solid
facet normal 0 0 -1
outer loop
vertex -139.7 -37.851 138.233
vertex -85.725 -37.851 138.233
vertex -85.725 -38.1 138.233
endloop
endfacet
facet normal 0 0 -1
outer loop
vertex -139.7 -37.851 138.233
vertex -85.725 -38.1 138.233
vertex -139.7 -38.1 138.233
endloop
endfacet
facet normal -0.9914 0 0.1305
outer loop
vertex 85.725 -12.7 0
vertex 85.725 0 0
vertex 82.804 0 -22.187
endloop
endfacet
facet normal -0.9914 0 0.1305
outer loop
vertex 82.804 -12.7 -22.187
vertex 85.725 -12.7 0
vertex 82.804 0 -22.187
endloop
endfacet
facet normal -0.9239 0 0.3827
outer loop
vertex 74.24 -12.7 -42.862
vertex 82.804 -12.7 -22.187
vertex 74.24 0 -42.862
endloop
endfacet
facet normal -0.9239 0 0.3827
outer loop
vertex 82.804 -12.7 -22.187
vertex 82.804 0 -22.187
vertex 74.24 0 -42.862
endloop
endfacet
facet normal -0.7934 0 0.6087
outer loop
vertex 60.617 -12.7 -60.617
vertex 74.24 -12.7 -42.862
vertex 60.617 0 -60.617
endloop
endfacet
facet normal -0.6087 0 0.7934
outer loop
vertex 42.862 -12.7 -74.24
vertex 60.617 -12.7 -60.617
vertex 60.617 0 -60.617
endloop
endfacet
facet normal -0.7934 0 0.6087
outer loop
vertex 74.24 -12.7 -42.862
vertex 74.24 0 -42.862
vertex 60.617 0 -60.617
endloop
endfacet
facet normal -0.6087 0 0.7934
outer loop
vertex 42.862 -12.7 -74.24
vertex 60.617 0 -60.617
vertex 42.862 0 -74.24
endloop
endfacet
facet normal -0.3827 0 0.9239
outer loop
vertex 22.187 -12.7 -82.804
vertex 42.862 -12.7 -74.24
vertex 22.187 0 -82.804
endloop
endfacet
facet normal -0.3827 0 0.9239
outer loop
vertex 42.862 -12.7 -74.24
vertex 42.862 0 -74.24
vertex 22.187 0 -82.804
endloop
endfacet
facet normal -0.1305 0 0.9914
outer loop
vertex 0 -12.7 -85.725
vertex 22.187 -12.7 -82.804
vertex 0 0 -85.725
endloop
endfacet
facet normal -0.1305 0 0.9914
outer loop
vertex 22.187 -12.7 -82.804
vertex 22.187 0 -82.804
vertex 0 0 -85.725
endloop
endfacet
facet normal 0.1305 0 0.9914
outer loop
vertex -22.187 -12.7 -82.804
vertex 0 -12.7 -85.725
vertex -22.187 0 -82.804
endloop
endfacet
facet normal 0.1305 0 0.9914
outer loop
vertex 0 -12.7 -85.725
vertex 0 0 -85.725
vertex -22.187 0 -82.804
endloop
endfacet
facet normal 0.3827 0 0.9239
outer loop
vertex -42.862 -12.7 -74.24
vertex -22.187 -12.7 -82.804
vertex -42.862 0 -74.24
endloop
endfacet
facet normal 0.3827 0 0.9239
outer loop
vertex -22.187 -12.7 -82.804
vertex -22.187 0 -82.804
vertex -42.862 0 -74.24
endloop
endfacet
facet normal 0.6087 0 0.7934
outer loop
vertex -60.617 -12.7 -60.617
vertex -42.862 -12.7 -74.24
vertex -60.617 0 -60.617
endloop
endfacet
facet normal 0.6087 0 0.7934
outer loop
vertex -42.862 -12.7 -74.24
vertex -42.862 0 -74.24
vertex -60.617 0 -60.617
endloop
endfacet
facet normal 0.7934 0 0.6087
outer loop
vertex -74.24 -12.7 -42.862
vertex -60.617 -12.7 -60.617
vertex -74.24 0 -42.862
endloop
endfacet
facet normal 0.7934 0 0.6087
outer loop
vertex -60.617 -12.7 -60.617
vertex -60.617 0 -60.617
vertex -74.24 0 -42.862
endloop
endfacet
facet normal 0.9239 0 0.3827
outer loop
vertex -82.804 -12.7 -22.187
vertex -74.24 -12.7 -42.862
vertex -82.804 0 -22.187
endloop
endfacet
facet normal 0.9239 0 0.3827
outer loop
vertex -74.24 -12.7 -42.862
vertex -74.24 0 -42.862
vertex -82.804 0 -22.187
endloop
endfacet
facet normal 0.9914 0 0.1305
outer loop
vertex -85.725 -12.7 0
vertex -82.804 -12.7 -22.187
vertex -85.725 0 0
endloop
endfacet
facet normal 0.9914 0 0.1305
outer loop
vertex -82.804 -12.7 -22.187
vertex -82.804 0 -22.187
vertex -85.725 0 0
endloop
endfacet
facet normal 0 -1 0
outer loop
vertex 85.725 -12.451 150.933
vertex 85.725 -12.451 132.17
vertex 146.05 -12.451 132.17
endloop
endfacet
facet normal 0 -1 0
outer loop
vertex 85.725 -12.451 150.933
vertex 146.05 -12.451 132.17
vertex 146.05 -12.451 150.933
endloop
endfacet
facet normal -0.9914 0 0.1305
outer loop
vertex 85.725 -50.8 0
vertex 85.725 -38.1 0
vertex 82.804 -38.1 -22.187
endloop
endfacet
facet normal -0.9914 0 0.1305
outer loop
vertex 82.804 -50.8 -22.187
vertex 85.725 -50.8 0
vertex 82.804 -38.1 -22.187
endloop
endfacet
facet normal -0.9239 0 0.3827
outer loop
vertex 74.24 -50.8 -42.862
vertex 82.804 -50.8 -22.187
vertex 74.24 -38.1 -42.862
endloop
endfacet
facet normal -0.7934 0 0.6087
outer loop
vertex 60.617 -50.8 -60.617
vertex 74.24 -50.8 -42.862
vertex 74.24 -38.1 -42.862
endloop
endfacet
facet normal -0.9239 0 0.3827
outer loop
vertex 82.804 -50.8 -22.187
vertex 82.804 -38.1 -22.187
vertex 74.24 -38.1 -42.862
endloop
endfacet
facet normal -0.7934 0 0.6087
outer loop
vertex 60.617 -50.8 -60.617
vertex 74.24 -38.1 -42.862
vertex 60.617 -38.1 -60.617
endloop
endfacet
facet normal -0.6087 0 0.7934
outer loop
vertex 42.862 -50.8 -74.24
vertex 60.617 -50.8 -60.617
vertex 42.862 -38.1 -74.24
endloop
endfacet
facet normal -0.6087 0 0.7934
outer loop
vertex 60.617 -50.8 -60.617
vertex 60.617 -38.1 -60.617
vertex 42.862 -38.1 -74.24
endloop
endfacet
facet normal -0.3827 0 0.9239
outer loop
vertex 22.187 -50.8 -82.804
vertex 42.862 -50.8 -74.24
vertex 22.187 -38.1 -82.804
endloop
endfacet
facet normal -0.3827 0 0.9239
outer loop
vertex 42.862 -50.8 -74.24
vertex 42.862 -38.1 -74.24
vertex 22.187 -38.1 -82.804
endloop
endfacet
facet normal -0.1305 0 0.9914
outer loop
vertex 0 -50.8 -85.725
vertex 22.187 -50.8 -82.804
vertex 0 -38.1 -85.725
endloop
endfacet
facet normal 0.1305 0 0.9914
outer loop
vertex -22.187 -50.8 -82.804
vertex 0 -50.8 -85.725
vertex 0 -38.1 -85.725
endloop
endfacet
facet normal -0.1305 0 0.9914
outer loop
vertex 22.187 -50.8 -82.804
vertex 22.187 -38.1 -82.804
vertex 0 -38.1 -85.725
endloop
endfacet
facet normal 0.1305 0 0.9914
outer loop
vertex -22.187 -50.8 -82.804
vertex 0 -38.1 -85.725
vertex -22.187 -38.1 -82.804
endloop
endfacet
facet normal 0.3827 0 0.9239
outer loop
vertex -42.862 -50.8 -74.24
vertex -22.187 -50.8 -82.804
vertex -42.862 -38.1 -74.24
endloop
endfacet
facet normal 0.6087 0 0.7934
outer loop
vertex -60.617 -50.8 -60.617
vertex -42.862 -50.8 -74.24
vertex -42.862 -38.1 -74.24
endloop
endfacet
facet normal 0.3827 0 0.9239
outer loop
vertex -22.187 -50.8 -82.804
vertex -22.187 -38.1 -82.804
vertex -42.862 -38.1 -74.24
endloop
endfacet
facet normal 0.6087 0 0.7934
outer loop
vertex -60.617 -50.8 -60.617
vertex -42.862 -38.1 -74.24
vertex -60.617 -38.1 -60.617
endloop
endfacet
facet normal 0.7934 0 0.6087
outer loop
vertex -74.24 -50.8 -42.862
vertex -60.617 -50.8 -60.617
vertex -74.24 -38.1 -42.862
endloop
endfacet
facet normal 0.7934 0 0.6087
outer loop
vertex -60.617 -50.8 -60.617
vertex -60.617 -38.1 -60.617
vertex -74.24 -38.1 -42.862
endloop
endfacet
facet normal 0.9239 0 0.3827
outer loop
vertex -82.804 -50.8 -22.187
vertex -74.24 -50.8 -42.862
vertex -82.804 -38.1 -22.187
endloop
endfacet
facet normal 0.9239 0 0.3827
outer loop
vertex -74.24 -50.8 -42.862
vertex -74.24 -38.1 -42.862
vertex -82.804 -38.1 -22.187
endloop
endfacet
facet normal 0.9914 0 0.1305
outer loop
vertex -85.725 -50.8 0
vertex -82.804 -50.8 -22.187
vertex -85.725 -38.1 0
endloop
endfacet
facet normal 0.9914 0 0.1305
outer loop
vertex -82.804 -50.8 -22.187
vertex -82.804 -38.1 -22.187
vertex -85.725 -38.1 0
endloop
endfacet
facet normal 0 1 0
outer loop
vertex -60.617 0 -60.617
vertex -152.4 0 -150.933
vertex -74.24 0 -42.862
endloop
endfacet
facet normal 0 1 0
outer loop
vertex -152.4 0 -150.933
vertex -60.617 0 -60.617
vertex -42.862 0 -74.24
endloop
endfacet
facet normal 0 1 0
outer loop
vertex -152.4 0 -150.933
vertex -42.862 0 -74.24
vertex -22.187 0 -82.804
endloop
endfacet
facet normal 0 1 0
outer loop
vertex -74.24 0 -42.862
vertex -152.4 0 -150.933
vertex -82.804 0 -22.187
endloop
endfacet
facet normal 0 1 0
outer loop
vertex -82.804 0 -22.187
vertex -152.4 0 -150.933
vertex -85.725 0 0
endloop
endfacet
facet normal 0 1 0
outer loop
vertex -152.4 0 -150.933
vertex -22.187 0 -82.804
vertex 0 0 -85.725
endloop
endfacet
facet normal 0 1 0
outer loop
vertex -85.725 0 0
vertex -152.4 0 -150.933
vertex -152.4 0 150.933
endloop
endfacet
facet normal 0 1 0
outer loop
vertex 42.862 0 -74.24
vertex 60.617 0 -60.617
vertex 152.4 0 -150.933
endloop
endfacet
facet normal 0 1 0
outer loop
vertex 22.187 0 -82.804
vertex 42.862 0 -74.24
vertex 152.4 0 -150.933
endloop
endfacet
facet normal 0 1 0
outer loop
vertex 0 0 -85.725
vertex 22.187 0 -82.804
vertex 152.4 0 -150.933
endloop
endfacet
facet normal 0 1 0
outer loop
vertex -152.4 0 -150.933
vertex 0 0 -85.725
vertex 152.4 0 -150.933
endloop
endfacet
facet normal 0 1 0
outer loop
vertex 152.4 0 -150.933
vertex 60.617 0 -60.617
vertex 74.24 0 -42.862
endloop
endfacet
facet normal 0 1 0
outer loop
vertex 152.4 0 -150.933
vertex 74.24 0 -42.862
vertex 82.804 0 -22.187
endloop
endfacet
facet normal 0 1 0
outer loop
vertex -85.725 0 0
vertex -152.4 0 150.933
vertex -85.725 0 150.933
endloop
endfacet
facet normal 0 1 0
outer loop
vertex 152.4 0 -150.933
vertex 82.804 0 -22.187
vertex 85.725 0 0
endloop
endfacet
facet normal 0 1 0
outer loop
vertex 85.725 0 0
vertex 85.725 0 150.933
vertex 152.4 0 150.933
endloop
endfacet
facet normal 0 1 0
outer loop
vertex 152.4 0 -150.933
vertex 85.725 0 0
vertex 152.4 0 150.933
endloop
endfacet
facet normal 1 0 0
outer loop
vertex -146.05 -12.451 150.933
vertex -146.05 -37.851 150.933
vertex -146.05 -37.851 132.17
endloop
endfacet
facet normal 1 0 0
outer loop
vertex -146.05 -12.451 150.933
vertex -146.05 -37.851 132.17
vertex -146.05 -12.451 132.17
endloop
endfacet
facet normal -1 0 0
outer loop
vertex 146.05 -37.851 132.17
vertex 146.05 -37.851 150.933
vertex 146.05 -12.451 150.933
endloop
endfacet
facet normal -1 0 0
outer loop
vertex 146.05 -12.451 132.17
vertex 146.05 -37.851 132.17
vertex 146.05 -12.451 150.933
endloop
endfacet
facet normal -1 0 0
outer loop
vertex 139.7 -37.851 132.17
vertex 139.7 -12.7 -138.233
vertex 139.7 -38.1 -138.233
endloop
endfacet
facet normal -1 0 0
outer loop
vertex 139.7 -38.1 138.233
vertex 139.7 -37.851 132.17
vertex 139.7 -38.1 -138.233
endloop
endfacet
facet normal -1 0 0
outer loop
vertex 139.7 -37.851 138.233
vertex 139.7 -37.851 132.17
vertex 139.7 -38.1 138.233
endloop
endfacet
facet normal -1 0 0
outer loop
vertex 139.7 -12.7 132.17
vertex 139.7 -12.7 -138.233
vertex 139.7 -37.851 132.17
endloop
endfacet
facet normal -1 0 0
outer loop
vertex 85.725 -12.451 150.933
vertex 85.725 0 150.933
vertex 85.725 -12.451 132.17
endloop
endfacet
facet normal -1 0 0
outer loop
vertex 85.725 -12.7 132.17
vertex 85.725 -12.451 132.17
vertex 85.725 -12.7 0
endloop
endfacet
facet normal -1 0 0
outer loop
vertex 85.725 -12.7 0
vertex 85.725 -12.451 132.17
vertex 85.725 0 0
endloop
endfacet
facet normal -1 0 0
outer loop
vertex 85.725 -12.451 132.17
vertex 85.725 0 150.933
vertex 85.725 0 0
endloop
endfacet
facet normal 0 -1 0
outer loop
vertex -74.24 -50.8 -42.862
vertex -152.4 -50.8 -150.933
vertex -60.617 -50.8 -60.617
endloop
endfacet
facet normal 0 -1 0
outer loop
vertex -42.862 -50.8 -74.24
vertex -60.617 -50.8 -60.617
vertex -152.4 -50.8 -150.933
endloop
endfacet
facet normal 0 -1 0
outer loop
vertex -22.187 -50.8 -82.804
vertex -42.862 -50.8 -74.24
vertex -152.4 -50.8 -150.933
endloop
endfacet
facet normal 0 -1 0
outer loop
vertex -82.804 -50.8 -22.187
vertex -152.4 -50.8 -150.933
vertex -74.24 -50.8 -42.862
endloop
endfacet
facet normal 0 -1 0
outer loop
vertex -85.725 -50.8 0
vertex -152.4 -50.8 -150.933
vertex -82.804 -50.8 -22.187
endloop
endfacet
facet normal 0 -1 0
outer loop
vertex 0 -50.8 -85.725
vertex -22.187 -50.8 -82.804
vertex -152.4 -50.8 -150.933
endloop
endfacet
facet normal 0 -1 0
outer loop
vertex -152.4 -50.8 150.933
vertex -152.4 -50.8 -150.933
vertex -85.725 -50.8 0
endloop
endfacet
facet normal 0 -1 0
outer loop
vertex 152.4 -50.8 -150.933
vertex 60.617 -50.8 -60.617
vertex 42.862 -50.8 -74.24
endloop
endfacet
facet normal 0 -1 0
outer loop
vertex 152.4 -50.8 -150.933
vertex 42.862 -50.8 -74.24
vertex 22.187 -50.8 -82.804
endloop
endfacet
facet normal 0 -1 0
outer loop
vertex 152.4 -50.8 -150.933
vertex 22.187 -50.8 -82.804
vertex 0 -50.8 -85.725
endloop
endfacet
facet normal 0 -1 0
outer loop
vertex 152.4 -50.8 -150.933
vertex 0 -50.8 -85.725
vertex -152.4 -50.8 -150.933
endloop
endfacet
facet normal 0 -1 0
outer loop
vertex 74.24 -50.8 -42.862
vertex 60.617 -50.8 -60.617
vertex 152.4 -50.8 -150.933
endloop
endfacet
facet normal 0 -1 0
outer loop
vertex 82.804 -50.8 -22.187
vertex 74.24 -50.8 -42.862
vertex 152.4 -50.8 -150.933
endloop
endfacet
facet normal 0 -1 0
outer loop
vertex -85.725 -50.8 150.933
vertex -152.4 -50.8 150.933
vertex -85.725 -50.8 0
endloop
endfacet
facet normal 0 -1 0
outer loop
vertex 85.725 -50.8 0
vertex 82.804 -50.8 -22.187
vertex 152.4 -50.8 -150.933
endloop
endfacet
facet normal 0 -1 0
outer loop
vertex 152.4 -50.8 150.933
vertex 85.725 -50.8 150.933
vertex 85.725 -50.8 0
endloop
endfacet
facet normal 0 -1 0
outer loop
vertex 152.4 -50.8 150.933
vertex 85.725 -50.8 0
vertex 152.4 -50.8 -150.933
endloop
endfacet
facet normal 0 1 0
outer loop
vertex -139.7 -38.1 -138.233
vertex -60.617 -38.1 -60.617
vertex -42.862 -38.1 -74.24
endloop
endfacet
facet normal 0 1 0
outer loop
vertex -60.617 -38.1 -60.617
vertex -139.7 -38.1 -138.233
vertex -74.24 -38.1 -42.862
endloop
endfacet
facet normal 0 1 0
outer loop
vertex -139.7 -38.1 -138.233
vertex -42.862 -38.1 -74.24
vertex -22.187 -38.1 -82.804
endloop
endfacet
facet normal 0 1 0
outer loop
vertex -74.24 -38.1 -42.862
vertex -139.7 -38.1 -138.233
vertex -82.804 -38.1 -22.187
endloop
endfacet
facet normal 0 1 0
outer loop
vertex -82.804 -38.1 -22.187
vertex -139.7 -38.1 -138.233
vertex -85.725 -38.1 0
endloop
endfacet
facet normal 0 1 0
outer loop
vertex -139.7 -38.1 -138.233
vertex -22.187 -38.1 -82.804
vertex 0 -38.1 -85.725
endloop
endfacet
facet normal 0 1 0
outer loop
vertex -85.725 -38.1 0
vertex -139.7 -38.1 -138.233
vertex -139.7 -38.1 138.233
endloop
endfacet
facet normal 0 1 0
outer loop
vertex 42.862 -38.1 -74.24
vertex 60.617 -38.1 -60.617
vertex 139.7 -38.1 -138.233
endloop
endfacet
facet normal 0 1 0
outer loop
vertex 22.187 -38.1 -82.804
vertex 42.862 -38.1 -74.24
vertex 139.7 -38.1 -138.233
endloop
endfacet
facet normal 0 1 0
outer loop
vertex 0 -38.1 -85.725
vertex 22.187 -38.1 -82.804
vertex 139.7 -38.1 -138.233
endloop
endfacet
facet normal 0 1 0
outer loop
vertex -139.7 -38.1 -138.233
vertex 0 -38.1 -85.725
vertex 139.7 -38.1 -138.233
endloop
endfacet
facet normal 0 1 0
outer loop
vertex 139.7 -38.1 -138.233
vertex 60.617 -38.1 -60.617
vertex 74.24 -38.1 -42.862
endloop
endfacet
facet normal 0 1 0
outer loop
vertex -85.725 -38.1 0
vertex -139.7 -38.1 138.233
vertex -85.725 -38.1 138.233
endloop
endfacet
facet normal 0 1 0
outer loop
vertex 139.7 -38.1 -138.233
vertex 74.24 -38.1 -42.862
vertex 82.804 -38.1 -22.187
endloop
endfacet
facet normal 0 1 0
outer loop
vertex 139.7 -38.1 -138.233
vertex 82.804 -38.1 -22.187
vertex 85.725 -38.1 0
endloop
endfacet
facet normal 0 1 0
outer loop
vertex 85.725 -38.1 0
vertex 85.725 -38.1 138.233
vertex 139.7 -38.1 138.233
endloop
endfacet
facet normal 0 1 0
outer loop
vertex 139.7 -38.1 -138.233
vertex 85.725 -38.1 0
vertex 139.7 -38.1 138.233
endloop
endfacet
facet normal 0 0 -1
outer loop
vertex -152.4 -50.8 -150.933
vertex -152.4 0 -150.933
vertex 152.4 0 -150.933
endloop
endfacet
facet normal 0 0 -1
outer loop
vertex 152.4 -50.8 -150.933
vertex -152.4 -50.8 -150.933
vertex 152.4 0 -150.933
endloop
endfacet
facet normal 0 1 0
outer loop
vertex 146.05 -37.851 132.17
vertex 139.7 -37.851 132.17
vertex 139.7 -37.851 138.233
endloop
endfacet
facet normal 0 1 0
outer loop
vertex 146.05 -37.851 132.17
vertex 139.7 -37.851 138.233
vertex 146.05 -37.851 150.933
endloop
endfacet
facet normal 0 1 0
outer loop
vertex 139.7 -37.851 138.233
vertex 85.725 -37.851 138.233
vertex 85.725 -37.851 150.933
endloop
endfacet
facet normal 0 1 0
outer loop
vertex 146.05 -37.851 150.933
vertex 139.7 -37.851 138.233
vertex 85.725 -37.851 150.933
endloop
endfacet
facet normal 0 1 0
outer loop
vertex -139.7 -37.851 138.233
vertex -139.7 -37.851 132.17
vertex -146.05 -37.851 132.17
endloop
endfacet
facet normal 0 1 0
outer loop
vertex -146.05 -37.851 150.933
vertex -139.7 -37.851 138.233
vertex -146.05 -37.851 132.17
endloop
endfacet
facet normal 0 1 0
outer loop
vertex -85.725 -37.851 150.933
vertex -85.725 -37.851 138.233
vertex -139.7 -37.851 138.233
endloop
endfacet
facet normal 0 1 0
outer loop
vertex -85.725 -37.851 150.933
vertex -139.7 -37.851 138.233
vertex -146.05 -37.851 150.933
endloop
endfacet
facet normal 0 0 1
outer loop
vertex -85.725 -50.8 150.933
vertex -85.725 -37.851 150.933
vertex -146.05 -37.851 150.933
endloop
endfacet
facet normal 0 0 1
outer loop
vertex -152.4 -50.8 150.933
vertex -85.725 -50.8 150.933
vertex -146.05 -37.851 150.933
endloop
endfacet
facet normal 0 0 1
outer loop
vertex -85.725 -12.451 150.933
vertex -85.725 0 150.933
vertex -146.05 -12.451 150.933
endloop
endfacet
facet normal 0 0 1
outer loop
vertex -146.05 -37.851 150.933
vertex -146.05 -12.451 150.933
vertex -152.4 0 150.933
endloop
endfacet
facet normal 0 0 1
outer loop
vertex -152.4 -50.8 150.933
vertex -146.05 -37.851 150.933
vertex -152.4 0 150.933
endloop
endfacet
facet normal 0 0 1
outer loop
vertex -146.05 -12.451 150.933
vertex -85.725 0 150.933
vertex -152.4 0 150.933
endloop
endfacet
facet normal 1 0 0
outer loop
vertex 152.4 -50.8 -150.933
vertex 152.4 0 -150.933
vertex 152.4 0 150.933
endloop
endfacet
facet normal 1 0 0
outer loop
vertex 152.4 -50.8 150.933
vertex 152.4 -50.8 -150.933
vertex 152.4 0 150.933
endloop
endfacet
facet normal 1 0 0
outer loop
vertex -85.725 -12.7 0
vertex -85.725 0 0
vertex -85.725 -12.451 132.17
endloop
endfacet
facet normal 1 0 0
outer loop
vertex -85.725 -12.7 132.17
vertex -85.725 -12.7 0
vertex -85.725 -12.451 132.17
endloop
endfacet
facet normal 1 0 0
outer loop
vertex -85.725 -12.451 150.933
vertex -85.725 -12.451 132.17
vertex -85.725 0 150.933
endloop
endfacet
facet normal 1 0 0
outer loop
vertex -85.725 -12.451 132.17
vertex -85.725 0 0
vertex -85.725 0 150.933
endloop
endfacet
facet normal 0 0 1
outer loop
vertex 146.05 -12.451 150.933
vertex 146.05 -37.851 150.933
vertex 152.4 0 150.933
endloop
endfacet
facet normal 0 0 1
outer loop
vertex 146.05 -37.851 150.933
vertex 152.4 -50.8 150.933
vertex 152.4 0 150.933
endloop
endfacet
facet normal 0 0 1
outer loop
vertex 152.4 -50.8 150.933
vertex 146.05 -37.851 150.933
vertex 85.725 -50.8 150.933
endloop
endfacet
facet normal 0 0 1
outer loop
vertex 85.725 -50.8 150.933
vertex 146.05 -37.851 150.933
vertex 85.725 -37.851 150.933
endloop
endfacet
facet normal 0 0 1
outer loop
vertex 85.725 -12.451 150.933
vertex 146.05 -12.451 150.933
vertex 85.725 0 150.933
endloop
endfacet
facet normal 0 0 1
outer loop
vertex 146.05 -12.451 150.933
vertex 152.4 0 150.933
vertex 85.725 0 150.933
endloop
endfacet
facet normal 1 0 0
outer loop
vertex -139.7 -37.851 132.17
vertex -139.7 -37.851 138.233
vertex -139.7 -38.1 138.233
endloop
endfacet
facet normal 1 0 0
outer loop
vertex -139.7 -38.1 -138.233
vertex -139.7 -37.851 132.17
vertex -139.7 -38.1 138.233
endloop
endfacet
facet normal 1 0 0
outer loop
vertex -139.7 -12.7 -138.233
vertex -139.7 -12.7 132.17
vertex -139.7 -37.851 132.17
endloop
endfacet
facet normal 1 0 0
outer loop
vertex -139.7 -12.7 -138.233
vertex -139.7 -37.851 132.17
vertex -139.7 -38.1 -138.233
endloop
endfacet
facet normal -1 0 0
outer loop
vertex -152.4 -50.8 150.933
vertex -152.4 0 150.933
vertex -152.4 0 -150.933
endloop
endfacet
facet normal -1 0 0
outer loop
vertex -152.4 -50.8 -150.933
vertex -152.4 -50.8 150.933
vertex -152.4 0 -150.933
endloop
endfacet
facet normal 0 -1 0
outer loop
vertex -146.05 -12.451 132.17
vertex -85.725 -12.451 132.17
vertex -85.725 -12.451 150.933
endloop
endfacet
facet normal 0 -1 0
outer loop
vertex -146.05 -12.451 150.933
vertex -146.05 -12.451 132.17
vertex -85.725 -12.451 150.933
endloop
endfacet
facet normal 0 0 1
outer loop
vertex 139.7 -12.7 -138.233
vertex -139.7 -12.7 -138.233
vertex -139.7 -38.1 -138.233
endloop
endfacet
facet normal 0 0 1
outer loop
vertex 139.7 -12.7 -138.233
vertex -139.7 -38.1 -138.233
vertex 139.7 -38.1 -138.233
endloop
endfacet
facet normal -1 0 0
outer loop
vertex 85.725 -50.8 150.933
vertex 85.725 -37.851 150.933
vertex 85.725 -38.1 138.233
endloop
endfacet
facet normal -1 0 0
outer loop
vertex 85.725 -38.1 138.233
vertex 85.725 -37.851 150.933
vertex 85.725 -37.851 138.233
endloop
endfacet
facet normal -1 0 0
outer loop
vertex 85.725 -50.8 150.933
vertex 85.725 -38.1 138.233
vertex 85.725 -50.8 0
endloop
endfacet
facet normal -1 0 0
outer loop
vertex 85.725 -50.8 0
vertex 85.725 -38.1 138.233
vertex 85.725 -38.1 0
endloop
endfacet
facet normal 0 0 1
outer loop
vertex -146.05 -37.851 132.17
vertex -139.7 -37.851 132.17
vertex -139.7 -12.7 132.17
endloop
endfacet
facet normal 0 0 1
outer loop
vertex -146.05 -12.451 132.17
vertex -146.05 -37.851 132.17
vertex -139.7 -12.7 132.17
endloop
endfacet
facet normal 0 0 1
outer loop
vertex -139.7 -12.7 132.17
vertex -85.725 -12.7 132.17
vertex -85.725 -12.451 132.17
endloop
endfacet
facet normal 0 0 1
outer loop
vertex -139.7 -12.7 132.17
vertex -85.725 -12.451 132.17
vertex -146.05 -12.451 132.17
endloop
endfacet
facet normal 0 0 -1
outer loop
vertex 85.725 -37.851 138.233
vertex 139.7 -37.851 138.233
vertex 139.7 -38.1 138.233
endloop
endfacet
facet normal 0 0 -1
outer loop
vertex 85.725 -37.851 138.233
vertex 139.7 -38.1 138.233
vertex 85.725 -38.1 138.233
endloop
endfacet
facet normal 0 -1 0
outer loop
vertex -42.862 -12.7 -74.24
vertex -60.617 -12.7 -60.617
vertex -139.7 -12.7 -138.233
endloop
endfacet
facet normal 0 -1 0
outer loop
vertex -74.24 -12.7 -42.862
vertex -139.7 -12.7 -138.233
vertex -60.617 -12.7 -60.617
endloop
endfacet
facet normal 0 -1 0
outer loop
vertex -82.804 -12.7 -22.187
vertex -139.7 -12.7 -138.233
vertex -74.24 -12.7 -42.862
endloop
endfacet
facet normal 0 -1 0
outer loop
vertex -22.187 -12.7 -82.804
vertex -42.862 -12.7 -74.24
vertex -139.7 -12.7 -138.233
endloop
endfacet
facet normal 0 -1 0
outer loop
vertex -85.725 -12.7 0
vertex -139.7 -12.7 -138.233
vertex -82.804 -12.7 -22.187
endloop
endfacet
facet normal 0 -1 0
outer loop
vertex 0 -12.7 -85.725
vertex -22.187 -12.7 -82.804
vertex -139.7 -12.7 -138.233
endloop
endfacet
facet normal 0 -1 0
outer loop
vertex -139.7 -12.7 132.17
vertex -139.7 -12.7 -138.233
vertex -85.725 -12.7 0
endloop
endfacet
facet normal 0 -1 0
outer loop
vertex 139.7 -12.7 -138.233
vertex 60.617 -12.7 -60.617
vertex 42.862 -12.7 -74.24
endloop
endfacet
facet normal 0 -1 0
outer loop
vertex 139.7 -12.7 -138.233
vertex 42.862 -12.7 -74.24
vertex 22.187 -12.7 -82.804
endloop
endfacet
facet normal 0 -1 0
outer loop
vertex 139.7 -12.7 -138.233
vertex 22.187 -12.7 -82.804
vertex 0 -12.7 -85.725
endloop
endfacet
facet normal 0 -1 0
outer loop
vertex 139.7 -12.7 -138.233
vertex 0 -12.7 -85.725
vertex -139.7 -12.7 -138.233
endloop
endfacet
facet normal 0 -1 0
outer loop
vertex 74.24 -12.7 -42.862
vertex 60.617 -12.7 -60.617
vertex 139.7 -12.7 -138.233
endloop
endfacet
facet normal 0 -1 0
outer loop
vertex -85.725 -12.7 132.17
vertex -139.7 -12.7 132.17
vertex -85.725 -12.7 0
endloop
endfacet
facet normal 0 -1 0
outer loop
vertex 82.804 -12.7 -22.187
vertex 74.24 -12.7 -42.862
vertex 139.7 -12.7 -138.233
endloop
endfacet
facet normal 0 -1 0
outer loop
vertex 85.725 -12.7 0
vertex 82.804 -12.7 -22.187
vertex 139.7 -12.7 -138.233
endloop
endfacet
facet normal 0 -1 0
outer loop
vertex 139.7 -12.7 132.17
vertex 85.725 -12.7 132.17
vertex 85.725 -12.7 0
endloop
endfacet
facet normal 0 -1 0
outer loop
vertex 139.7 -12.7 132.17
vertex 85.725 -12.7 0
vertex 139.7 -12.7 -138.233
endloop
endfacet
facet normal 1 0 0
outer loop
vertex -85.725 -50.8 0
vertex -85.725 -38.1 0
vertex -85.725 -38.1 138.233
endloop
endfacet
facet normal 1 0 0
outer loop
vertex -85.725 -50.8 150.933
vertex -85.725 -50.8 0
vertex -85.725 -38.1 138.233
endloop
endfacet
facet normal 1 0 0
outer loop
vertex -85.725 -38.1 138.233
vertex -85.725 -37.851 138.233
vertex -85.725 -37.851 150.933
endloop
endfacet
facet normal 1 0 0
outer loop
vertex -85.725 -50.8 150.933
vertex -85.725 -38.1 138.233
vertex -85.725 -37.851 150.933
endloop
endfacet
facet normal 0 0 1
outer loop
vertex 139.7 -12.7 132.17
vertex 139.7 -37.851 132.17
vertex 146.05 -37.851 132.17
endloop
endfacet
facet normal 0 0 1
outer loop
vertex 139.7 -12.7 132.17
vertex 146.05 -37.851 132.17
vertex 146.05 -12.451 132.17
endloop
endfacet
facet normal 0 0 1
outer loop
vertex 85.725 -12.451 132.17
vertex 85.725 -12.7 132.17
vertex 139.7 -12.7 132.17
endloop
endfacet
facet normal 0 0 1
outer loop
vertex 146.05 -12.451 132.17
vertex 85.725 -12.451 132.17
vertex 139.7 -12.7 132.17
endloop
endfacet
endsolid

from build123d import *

# Parameters (mm, degrees)
F1_DEPTH = 50.8
F2_T     = -12.7
F3_W     = 25.4
F3_H     = 38.1000075253
F4_DEPTH = 146.05
F5_DEPTH = 146.05


with BuildPart() as f1:
    # F0 (on Front) → F1 (new body)
    with BuildSketch(Plane.XZ):
        with BuildLine():
            Line((152.4, -150.9333811935), (152.4, 150.9333811935))
            Line((152.4, 150.9333811935), (85.725, 150.9333811935))
            Line((85.725, 150.9333811935), (85.725, 0))
            ThreePointArc((85.725, 0), (0, -85.725), (-85.725, 0))
            Line((-85.725, 0), (-85.725, 150.9333811935))
            Line((-85.725, 150.9333811935), (-152.4, 150.9333811935))
            Line((-152.4, 150.9333811935), (-152.4, -150.9333811935))
            Line((-152.4, -150.9333811935), (152.4, -150.9333811935))
        make_face()
    extrude(amount=F1_DEPTH)

    # F2
    f2_openings = [f1.faces().sort_by_distance(p)[0] for p in [
        (85.725, -25.4, 75.466691),
        (0, -25.4, -85.725),
        (-85.725, -25.4, 75.466691),
    ]]
    offset(amount=F2_T, openings=f2_openings)

    # F3 (on Right) → F4 (cut)
    with BuildSketch(Plane.YZ):
        with Locations((-25.1512676477, 151.2203067541)):
            Rectangle(F3_W, F3_H)
    extrude(amount=-F4_DEPTH, mode=Mode.SUBTRACT)

    # F3 (on Right) → F5 (cut)
    with BuildSketch(Plane.YZ):
        with Locations((-25.1512676477, 151.2203067541)):
            Rectangle(F3_W, F3_H)
    extrude(amount=F5_DEPTH, mode=Mode.SUBTRACT)


solid = f1.part
